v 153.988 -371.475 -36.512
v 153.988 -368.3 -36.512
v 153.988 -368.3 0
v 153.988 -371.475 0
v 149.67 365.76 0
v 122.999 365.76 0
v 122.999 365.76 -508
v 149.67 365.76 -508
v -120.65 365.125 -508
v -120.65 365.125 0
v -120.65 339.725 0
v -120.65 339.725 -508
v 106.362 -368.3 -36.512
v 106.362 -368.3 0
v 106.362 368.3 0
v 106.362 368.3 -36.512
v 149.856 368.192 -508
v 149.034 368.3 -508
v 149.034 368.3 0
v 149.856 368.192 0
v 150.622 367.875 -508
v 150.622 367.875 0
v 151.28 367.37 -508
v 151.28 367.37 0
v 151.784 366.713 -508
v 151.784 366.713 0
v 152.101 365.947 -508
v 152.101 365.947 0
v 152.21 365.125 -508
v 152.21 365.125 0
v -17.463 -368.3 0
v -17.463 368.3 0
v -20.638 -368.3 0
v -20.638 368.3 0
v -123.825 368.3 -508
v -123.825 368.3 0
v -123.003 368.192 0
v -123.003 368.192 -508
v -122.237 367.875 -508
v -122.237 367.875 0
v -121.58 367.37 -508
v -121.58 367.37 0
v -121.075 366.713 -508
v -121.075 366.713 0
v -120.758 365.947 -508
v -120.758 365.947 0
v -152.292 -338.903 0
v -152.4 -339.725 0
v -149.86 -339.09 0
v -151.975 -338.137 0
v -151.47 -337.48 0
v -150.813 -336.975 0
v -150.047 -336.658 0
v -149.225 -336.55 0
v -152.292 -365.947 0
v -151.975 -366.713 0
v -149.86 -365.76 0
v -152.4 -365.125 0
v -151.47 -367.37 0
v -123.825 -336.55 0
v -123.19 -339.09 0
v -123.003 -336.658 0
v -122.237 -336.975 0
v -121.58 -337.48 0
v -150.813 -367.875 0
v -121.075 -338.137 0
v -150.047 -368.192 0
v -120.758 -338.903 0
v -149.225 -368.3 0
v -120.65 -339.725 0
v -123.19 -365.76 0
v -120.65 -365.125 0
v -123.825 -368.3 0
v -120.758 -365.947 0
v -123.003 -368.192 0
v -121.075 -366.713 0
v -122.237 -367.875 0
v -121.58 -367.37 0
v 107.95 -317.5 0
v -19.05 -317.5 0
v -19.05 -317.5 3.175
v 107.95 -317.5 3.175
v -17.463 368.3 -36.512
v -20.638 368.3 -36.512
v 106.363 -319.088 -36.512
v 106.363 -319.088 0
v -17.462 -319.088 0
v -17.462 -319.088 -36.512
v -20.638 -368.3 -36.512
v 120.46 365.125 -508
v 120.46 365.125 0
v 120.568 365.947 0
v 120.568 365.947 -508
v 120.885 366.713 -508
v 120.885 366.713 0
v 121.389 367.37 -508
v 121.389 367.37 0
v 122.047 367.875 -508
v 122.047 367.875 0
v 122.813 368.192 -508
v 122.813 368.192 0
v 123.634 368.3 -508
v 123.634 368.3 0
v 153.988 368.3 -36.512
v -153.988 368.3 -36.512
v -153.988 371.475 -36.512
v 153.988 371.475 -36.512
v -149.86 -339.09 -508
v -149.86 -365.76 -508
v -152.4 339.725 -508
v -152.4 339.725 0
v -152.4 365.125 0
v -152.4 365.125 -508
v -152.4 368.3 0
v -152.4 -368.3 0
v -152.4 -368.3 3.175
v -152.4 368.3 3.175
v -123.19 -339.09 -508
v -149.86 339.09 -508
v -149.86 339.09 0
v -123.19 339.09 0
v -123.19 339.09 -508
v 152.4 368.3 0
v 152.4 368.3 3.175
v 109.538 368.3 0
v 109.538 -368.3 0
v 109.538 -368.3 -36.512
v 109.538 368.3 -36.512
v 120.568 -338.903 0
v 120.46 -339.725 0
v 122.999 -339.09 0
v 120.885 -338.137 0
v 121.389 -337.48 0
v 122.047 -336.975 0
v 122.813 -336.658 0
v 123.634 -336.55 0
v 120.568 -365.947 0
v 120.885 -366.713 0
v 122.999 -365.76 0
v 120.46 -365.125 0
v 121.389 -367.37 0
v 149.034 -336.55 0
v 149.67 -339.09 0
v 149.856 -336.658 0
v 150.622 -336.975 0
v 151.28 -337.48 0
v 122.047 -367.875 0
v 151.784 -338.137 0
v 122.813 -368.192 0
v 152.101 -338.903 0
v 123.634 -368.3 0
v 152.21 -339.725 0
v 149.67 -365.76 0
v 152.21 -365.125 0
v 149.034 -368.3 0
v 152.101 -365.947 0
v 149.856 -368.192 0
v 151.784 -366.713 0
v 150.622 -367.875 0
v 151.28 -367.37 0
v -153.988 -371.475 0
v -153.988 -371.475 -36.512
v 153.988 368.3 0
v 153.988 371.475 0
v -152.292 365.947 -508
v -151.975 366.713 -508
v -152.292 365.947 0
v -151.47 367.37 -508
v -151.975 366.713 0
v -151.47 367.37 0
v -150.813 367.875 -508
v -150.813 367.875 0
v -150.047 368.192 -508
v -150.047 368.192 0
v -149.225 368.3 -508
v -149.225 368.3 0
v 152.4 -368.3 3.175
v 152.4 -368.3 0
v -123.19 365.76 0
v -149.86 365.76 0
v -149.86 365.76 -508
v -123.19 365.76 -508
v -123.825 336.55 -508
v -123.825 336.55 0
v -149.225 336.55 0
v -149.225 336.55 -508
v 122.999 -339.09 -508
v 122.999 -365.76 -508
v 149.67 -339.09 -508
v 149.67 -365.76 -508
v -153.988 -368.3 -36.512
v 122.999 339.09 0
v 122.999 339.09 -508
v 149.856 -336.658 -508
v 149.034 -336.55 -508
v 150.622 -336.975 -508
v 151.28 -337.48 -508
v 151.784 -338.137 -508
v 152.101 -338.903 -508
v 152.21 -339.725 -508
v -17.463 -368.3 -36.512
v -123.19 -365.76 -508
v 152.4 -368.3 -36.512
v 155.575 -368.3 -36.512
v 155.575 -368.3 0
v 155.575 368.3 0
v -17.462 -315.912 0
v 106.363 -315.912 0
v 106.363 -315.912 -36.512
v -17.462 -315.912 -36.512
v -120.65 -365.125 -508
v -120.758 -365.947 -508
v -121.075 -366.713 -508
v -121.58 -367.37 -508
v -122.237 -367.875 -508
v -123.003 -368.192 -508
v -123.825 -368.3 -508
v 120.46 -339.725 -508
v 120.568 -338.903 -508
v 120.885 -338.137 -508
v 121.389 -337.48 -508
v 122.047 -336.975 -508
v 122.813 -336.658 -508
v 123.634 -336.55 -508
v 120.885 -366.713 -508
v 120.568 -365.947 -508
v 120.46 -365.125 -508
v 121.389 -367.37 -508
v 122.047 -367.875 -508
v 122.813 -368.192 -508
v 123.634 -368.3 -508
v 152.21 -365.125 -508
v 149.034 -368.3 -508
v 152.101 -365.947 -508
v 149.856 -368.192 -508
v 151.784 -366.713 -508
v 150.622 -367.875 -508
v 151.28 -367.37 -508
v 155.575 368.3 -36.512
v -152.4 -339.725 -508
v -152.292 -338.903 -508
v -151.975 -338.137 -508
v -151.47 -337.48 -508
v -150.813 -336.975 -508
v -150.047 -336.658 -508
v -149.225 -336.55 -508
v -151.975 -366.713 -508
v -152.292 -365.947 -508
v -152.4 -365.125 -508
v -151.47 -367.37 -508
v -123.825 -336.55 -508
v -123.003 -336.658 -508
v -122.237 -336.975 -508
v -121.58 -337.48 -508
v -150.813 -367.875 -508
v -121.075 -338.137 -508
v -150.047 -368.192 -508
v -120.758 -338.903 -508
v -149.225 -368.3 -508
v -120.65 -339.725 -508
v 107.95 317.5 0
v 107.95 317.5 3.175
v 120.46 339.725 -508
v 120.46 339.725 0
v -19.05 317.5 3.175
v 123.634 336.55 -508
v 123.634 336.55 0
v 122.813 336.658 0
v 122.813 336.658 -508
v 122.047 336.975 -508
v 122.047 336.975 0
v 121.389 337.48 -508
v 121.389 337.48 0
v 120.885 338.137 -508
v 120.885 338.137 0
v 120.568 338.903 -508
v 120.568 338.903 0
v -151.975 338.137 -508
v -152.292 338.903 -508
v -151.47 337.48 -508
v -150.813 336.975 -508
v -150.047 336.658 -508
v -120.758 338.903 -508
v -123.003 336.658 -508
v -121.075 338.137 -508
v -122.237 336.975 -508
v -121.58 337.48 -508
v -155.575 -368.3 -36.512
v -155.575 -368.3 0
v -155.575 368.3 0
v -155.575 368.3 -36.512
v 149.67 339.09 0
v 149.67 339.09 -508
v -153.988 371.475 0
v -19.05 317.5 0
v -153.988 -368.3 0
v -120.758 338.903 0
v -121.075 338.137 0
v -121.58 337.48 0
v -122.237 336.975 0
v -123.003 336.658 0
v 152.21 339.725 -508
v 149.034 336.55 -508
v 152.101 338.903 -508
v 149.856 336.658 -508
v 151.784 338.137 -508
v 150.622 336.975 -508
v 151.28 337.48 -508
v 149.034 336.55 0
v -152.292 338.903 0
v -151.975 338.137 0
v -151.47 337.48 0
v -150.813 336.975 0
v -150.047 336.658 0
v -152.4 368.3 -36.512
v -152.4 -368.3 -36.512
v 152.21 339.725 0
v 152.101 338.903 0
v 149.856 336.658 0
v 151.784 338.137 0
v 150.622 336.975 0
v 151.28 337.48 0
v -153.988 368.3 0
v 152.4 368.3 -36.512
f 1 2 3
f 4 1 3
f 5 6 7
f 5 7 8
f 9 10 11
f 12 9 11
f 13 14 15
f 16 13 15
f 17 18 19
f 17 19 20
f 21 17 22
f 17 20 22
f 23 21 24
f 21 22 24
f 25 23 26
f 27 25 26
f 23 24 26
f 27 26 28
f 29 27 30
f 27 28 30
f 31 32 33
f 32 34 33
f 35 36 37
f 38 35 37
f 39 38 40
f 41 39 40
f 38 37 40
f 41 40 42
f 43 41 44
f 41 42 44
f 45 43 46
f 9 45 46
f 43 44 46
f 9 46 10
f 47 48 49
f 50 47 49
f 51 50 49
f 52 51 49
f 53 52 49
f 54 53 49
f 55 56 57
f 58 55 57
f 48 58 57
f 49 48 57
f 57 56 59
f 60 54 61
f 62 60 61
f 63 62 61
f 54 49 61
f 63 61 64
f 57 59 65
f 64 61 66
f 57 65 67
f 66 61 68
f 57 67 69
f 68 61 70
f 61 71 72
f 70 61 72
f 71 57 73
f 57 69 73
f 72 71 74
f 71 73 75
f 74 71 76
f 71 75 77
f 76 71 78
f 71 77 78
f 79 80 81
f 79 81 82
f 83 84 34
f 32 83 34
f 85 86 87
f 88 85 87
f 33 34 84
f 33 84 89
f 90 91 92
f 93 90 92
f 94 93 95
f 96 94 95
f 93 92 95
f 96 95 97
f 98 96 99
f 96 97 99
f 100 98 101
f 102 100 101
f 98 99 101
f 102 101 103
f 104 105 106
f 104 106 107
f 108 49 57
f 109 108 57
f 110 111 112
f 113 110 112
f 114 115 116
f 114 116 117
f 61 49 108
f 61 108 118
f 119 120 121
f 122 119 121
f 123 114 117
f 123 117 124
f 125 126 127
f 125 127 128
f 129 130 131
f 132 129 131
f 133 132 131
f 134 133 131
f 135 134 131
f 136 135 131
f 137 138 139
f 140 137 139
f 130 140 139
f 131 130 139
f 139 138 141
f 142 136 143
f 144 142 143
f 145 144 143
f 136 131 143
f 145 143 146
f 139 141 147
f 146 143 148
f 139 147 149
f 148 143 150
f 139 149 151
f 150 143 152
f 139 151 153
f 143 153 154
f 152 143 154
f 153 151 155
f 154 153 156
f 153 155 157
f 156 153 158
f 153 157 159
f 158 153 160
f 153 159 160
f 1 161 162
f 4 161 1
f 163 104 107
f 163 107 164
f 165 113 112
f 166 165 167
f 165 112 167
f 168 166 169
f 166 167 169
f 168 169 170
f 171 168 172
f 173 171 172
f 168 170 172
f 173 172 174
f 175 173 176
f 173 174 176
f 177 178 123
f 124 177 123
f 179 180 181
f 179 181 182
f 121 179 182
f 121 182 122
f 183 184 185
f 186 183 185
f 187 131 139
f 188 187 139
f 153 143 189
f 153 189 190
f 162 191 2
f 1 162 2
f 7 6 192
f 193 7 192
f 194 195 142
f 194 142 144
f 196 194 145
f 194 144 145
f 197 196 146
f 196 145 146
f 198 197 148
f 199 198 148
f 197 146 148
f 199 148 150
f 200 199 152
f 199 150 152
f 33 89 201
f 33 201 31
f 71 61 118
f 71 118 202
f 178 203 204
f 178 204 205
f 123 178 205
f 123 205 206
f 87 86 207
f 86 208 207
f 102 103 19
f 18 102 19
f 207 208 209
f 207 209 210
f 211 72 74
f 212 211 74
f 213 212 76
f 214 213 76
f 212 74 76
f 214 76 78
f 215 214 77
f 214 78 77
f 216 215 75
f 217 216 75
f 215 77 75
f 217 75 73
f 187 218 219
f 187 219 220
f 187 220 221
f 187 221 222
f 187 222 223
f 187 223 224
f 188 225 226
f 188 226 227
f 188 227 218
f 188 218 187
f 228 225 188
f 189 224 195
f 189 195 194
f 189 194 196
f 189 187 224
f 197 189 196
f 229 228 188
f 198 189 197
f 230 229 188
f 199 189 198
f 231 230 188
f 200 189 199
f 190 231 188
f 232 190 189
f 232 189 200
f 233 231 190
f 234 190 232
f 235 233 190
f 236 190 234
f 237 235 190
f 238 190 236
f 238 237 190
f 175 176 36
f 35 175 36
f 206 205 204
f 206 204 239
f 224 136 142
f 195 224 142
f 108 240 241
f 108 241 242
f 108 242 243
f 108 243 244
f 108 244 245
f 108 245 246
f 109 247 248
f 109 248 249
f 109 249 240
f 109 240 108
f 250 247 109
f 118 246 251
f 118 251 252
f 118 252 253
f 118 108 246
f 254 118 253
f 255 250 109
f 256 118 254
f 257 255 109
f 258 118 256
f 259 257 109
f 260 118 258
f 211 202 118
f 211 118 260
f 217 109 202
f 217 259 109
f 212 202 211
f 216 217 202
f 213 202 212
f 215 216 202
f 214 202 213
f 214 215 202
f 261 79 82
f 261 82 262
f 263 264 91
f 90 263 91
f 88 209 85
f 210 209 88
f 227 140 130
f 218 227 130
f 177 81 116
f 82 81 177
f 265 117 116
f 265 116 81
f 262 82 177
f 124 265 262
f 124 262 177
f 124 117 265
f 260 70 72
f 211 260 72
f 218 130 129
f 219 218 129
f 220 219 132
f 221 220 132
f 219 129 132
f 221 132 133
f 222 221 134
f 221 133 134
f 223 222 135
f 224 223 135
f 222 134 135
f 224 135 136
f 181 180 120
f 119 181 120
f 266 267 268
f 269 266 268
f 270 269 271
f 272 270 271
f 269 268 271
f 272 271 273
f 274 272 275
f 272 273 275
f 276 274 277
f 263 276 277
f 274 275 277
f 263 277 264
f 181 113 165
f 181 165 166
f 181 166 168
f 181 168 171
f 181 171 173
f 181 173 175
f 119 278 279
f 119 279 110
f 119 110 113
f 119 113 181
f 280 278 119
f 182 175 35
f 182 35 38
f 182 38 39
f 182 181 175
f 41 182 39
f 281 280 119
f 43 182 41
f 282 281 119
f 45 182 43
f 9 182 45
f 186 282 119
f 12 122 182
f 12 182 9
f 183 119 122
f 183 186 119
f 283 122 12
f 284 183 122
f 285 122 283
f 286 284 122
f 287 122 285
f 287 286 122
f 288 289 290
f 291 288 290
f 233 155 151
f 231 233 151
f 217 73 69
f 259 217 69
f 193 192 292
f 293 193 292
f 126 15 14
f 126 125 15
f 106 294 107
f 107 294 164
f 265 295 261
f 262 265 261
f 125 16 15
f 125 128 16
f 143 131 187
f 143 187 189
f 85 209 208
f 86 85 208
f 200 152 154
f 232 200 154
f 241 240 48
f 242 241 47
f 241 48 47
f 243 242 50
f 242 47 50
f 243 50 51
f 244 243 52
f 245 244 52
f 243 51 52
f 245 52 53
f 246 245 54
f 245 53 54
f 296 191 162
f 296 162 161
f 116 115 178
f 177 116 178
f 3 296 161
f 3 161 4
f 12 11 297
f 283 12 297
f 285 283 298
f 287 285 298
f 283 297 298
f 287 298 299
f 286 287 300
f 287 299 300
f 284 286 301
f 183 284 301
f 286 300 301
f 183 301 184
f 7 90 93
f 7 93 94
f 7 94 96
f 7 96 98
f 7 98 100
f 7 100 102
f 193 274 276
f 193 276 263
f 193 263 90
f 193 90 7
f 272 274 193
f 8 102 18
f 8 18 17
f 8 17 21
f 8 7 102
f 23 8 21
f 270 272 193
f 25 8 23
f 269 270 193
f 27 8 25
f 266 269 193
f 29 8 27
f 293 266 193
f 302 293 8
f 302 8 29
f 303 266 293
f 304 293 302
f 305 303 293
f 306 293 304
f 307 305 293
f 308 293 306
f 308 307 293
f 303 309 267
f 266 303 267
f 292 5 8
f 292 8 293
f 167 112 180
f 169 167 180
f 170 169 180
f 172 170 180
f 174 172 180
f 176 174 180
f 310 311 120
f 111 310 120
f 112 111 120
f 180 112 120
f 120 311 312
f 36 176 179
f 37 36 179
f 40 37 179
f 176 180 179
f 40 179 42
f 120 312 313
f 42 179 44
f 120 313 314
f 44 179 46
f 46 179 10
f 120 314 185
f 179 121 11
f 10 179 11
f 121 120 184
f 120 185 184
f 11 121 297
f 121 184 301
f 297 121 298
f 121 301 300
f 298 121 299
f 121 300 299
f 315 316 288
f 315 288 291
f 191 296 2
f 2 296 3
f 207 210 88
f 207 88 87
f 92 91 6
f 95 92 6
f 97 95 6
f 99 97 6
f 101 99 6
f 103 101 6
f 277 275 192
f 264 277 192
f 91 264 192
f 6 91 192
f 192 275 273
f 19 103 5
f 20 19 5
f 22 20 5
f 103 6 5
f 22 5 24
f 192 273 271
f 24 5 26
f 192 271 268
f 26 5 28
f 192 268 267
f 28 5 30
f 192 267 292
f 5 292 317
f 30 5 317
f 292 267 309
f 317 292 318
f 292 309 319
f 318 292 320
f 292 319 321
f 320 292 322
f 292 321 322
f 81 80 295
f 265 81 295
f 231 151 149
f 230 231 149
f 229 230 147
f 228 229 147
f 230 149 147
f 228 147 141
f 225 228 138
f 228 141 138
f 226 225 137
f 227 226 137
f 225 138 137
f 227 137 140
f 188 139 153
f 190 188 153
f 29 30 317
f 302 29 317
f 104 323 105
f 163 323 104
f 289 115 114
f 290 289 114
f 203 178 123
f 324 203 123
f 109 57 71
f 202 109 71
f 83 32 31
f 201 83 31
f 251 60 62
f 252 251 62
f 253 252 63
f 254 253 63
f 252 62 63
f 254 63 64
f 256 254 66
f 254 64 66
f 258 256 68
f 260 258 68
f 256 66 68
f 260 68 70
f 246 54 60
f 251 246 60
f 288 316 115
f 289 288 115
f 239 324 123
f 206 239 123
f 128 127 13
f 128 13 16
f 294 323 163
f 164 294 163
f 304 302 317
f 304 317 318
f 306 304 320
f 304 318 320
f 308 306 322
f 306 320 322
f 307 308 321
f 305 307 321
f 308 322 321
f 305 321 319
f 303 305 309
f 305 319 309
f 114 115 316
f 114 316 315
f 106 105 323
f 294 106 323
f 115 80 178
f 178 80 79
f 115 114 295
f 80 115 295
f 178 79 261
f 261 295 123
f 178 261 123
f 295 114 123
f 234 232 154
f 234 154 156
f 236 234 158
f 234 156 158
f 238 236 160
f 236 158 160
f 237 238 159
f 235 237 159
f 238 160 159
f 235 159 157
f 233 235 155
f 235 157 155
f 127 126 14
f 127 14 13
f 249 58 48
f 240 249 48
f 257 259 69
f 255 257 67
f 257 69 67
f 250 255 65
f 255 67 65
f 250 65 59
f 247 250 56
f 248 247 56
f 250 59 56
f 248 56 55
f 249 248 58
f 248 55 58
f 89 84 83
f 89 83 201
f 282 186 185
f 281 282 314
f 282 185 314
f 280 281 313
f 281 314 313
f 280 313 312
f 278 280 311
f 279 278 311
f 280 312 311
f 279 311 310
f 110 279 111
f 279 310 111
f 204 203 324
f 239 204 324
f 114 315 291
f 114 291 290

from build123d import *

# Parameters (mm, degrees)
F0_W      = 304.8
F0_H      = 736.6
F0_W_2    = 127
F0_H_2    = 635
F1_DEPTH  = 3.175
F2_W      = 736.6
F2_H      = 36.5125
F3_DEPTH  = 3.175
F5_W      = 307.975
F5_H      = 36.5125
F6_DEPTH  = 3.175
F9_W      = 736.6
F9_H      = 36.5125
F10_DEPTH = 1.5875
F13_DEPTH = 1.5875
F15_W     = 123.825
F15_H     = 36.5125
F16_DEPTH = 1.5875
F17_W     = 26.67
F17_H     = 26.67
F18_DEPTH = 508


with BuildPart() as f1:
    # F0 (on Top) → F1 (new body)
    with BuildSketch(Plane.XY):
        Rectangle(F0_W, F0_H)
        with Locations((44.45, 0)):
            Rectangle(F0_W_2, F0_H_2, mode=Mode.SUBTRACT)
    extrude(amount=F1_DEPTH)


with BuildPart() as f3:
    # F2 (on face) → F3 (new body)
    with BuildSketch(Plane.YZ.offset(152.4)):
        with Locations((0, -18.25625)):
            Rectangle(F2_W, F2_H)
    extrude(amount=F3_DEPTH)


with BuildPart() as f4_1:
    # F4: instance of F3
    add(f3.part.mirror(Plane.YZ))


with BuildPart() as f6:
    # F5 (on face) → F6 (new body)
    with BuildSketch(Plane.XZ.offset(368.3)):
        with Locations((0, -18.25625)):
            Rectangle(F5_W, F5_H)
    extrude(amount=F6_DEPTH)


with BuildPart() as f7_1:
    # F7: instance of F6
    add(f6.part.mirror(Plane.XZ))


with BuildPart() as f10:
    # F9 (on face) → F10 (new body, symmetric)
    with BuildSketch(Plane(origin=(-19.05, 0, 0), x_dir=(0, -1, 0), z_dir=(-1, 0, 0))):
        with Locations((0, -18.25625)):
            Rectangle(F9_W, F9_H)
    extrude(amount=F10_DEPTH, both=True)


with BuildPart() as f13:
    # F12 (on face) → F13 (new body, symmetric)
    with BuildSketch(Plane.YZ.offset(107.95)):
        Polygon((368.3, 0), (317.5, 0), (-317.5, 0), (-368.3, 0), (-368.3, -36.5125), (368.3, -36.5125), align=None)
    extrude(amount=F13_DEPTH, both=True)


with BuildPart() as f16:
    # F15 (on face) → F16 (new body, symmetric)
    with BuildSketch(Plane(origin=(0, -317.5, 0), x_dir=(-1, 0, 0), z_dir=(0, 1, 0))):
        with Locations((-44.45, -18.25625)):
            Rectangle(F15_W, F15_H)
    extrude(amount=F16_DEPTH, both=True)


with BuildPart() as f18:
    # F17 (on face) → F18 (new body)
    with BuildSketch(Plane(origin=(0, 0, 0), x_dir=(1, 0, 0), z_dir=(0, 0, -1))):
        with BuildLine():
            Line((-123.825, 368.3), (-149.225, 368.3))
            ThreePointArc((-149.225, 368.3), (-151.4700640303, 367.3700640303), (-152.4, 365.125))
            Line((-152.4, 365.125), (-152.4, 339.725))
            ThreePointArc((-152.4, 339.725), (-151.4700640303, 337.4799359697), (-149.225, 336.55))
            Line((-149.225, 336.55), (-123.825, 336.55))
            ThreePointArc((-123.825, 336.55), (-121.5799359697, 337.4799359697), (-120.65, 339.725))
            Line((-120.65, 339.725), (-120.65, 365.125))
            ThreePointArc((-120.65, 365.125), (-121.5799359697, 367.3700640303), (-123.825, 368.3))
        make_face()
        with Locations((-136.525, 352.425)):
            Rectangle(F17_W, F17_H, mode=Mode.SUBTRACT)
    extrude(amount=F18_DEPTH)


with BuildPart() as f18b:
    # F17 (on face) → F18, piece 2 (new body)
    with BuildSketch(Plane(origin=(0, 0, 0), x_dir=(1, 0, 0), z_dir=(0, 0, -1))):
        with BuildLine():
            Line((-120.65, -365.125), (-120.65, -339.725))
            ThreePointArc((-120.65, -339.725), (-121.5799359697, -337.4799359697), (-123.825, -336.55))
            Line((-123.825, -336.55), (-149.225, -336.55))
            ThreePointArc((-149.225, -336.55), (-151.4700640303, -337.4799359697), (-152.4, -339.725))
            Line((-152.4, -339.725), (-152.4, -365.125))
            ThreePointArc((-152.4, -365.125), (-151.4700640303, -367.3700640303), (-149.225, -368.3))
            Line((-149.225, -368.3), (-123.825, -368.3))
            ThreePointArc((-123.825, -368.3), (-121.5799359697, -367.3700640303), (-120.65, -365.125))
        make_face()
        with Locations((-136.525, -352.425)):
            Rectangle(F17_W, F17_H, mode=Mode.SUBTRACT)
    extrude(amount=F18_DEPTH)


with BuildPart() as f18c:
    # F17 (on face) → F18, piece 3 (new body)
    with BuildSketch(Plane(origin=(0, 0, 0), x_dir=(1, 0, 0), z_dir=(0, 0, -1))):
        with BuildLine():
            Line((152.2095, 339.725), (152.2095, 365.125))
            ThreePointArc((152.2095, 365.125), (151.2795640303, 367.3700640303), (149.0345, 368.3))
            Line((149.0345, 368.3), (123.6345, 368.3))
            ThreePointArc((123.6345, 368.3), (121.3894359697, 367.3700640303), (120.4595, 365.125))
            Line((120.4595, 365.125), (120.4595, 339.725))
            ThreePointArc((120.4595, 339.725), (121.3894359697, 337.4799359697), (123.6345, 336.55))
            Line((123.6345, 336.55), (149.0345, 336.55))
            ThreePointArc((149.0345, 336.55), (151.2795640303, 337.4799359697), (152.2095, 339.725))
        make_face()
        with Locations((136.3345, 352.425)):
            Rectangle(F17_W, F17_H, mode=Mode.SUBTRACT)
    extrude(amount=F18_DEPTH)


with BuildPart() as f18d:
    # F17 (on face) → F18, piece 4 (new body)
    with BuildSketch(Plane(origin=(0, 0, 0), x_dir=(1, 0, 0), z_dir=(0, 0, -1))):
        with BuildLine():
            Line((152.2095, -365.125), (152.2095, -339.725))
            ThreePointArc((152.2095, -339.725), (151.2795640303, -337.4799359697), (149.0345, -336.55))
            Line((149.0345, -336.55), (123.6345, -336.55))
            ThreePointArc((123.6345, -336.55), (121.3894359697, -337.4799359697), (120.4595, -339.725))
            Line((120.4595, -339.725), (120.4595, -365.125))
            ThreePointArc((120.4595, -365.125), (121.3894359697, -367.3700640303), (123.6345, -368.3))
            Line((123.6345, -368.3), (149.0345, -368.3))
            ThreePointArc((149.0345, -368.3), (151.2795640303, -367.3700640303), (152.2095, -365.125))
        make_face()
        with Locations((136.3345, -352.425)):
            Rectangle(F17_W, F17_H, mode=Mode.SUBTRACT)
    extrude(amount=F18_DEPTH)


solid = Compound([f1.part, f3.part, f4_1.part, f6.part, f7_1.part, f10.part, f13.part, f16.part, f18.part, f18b.part, f18c.part, f18d.part])
